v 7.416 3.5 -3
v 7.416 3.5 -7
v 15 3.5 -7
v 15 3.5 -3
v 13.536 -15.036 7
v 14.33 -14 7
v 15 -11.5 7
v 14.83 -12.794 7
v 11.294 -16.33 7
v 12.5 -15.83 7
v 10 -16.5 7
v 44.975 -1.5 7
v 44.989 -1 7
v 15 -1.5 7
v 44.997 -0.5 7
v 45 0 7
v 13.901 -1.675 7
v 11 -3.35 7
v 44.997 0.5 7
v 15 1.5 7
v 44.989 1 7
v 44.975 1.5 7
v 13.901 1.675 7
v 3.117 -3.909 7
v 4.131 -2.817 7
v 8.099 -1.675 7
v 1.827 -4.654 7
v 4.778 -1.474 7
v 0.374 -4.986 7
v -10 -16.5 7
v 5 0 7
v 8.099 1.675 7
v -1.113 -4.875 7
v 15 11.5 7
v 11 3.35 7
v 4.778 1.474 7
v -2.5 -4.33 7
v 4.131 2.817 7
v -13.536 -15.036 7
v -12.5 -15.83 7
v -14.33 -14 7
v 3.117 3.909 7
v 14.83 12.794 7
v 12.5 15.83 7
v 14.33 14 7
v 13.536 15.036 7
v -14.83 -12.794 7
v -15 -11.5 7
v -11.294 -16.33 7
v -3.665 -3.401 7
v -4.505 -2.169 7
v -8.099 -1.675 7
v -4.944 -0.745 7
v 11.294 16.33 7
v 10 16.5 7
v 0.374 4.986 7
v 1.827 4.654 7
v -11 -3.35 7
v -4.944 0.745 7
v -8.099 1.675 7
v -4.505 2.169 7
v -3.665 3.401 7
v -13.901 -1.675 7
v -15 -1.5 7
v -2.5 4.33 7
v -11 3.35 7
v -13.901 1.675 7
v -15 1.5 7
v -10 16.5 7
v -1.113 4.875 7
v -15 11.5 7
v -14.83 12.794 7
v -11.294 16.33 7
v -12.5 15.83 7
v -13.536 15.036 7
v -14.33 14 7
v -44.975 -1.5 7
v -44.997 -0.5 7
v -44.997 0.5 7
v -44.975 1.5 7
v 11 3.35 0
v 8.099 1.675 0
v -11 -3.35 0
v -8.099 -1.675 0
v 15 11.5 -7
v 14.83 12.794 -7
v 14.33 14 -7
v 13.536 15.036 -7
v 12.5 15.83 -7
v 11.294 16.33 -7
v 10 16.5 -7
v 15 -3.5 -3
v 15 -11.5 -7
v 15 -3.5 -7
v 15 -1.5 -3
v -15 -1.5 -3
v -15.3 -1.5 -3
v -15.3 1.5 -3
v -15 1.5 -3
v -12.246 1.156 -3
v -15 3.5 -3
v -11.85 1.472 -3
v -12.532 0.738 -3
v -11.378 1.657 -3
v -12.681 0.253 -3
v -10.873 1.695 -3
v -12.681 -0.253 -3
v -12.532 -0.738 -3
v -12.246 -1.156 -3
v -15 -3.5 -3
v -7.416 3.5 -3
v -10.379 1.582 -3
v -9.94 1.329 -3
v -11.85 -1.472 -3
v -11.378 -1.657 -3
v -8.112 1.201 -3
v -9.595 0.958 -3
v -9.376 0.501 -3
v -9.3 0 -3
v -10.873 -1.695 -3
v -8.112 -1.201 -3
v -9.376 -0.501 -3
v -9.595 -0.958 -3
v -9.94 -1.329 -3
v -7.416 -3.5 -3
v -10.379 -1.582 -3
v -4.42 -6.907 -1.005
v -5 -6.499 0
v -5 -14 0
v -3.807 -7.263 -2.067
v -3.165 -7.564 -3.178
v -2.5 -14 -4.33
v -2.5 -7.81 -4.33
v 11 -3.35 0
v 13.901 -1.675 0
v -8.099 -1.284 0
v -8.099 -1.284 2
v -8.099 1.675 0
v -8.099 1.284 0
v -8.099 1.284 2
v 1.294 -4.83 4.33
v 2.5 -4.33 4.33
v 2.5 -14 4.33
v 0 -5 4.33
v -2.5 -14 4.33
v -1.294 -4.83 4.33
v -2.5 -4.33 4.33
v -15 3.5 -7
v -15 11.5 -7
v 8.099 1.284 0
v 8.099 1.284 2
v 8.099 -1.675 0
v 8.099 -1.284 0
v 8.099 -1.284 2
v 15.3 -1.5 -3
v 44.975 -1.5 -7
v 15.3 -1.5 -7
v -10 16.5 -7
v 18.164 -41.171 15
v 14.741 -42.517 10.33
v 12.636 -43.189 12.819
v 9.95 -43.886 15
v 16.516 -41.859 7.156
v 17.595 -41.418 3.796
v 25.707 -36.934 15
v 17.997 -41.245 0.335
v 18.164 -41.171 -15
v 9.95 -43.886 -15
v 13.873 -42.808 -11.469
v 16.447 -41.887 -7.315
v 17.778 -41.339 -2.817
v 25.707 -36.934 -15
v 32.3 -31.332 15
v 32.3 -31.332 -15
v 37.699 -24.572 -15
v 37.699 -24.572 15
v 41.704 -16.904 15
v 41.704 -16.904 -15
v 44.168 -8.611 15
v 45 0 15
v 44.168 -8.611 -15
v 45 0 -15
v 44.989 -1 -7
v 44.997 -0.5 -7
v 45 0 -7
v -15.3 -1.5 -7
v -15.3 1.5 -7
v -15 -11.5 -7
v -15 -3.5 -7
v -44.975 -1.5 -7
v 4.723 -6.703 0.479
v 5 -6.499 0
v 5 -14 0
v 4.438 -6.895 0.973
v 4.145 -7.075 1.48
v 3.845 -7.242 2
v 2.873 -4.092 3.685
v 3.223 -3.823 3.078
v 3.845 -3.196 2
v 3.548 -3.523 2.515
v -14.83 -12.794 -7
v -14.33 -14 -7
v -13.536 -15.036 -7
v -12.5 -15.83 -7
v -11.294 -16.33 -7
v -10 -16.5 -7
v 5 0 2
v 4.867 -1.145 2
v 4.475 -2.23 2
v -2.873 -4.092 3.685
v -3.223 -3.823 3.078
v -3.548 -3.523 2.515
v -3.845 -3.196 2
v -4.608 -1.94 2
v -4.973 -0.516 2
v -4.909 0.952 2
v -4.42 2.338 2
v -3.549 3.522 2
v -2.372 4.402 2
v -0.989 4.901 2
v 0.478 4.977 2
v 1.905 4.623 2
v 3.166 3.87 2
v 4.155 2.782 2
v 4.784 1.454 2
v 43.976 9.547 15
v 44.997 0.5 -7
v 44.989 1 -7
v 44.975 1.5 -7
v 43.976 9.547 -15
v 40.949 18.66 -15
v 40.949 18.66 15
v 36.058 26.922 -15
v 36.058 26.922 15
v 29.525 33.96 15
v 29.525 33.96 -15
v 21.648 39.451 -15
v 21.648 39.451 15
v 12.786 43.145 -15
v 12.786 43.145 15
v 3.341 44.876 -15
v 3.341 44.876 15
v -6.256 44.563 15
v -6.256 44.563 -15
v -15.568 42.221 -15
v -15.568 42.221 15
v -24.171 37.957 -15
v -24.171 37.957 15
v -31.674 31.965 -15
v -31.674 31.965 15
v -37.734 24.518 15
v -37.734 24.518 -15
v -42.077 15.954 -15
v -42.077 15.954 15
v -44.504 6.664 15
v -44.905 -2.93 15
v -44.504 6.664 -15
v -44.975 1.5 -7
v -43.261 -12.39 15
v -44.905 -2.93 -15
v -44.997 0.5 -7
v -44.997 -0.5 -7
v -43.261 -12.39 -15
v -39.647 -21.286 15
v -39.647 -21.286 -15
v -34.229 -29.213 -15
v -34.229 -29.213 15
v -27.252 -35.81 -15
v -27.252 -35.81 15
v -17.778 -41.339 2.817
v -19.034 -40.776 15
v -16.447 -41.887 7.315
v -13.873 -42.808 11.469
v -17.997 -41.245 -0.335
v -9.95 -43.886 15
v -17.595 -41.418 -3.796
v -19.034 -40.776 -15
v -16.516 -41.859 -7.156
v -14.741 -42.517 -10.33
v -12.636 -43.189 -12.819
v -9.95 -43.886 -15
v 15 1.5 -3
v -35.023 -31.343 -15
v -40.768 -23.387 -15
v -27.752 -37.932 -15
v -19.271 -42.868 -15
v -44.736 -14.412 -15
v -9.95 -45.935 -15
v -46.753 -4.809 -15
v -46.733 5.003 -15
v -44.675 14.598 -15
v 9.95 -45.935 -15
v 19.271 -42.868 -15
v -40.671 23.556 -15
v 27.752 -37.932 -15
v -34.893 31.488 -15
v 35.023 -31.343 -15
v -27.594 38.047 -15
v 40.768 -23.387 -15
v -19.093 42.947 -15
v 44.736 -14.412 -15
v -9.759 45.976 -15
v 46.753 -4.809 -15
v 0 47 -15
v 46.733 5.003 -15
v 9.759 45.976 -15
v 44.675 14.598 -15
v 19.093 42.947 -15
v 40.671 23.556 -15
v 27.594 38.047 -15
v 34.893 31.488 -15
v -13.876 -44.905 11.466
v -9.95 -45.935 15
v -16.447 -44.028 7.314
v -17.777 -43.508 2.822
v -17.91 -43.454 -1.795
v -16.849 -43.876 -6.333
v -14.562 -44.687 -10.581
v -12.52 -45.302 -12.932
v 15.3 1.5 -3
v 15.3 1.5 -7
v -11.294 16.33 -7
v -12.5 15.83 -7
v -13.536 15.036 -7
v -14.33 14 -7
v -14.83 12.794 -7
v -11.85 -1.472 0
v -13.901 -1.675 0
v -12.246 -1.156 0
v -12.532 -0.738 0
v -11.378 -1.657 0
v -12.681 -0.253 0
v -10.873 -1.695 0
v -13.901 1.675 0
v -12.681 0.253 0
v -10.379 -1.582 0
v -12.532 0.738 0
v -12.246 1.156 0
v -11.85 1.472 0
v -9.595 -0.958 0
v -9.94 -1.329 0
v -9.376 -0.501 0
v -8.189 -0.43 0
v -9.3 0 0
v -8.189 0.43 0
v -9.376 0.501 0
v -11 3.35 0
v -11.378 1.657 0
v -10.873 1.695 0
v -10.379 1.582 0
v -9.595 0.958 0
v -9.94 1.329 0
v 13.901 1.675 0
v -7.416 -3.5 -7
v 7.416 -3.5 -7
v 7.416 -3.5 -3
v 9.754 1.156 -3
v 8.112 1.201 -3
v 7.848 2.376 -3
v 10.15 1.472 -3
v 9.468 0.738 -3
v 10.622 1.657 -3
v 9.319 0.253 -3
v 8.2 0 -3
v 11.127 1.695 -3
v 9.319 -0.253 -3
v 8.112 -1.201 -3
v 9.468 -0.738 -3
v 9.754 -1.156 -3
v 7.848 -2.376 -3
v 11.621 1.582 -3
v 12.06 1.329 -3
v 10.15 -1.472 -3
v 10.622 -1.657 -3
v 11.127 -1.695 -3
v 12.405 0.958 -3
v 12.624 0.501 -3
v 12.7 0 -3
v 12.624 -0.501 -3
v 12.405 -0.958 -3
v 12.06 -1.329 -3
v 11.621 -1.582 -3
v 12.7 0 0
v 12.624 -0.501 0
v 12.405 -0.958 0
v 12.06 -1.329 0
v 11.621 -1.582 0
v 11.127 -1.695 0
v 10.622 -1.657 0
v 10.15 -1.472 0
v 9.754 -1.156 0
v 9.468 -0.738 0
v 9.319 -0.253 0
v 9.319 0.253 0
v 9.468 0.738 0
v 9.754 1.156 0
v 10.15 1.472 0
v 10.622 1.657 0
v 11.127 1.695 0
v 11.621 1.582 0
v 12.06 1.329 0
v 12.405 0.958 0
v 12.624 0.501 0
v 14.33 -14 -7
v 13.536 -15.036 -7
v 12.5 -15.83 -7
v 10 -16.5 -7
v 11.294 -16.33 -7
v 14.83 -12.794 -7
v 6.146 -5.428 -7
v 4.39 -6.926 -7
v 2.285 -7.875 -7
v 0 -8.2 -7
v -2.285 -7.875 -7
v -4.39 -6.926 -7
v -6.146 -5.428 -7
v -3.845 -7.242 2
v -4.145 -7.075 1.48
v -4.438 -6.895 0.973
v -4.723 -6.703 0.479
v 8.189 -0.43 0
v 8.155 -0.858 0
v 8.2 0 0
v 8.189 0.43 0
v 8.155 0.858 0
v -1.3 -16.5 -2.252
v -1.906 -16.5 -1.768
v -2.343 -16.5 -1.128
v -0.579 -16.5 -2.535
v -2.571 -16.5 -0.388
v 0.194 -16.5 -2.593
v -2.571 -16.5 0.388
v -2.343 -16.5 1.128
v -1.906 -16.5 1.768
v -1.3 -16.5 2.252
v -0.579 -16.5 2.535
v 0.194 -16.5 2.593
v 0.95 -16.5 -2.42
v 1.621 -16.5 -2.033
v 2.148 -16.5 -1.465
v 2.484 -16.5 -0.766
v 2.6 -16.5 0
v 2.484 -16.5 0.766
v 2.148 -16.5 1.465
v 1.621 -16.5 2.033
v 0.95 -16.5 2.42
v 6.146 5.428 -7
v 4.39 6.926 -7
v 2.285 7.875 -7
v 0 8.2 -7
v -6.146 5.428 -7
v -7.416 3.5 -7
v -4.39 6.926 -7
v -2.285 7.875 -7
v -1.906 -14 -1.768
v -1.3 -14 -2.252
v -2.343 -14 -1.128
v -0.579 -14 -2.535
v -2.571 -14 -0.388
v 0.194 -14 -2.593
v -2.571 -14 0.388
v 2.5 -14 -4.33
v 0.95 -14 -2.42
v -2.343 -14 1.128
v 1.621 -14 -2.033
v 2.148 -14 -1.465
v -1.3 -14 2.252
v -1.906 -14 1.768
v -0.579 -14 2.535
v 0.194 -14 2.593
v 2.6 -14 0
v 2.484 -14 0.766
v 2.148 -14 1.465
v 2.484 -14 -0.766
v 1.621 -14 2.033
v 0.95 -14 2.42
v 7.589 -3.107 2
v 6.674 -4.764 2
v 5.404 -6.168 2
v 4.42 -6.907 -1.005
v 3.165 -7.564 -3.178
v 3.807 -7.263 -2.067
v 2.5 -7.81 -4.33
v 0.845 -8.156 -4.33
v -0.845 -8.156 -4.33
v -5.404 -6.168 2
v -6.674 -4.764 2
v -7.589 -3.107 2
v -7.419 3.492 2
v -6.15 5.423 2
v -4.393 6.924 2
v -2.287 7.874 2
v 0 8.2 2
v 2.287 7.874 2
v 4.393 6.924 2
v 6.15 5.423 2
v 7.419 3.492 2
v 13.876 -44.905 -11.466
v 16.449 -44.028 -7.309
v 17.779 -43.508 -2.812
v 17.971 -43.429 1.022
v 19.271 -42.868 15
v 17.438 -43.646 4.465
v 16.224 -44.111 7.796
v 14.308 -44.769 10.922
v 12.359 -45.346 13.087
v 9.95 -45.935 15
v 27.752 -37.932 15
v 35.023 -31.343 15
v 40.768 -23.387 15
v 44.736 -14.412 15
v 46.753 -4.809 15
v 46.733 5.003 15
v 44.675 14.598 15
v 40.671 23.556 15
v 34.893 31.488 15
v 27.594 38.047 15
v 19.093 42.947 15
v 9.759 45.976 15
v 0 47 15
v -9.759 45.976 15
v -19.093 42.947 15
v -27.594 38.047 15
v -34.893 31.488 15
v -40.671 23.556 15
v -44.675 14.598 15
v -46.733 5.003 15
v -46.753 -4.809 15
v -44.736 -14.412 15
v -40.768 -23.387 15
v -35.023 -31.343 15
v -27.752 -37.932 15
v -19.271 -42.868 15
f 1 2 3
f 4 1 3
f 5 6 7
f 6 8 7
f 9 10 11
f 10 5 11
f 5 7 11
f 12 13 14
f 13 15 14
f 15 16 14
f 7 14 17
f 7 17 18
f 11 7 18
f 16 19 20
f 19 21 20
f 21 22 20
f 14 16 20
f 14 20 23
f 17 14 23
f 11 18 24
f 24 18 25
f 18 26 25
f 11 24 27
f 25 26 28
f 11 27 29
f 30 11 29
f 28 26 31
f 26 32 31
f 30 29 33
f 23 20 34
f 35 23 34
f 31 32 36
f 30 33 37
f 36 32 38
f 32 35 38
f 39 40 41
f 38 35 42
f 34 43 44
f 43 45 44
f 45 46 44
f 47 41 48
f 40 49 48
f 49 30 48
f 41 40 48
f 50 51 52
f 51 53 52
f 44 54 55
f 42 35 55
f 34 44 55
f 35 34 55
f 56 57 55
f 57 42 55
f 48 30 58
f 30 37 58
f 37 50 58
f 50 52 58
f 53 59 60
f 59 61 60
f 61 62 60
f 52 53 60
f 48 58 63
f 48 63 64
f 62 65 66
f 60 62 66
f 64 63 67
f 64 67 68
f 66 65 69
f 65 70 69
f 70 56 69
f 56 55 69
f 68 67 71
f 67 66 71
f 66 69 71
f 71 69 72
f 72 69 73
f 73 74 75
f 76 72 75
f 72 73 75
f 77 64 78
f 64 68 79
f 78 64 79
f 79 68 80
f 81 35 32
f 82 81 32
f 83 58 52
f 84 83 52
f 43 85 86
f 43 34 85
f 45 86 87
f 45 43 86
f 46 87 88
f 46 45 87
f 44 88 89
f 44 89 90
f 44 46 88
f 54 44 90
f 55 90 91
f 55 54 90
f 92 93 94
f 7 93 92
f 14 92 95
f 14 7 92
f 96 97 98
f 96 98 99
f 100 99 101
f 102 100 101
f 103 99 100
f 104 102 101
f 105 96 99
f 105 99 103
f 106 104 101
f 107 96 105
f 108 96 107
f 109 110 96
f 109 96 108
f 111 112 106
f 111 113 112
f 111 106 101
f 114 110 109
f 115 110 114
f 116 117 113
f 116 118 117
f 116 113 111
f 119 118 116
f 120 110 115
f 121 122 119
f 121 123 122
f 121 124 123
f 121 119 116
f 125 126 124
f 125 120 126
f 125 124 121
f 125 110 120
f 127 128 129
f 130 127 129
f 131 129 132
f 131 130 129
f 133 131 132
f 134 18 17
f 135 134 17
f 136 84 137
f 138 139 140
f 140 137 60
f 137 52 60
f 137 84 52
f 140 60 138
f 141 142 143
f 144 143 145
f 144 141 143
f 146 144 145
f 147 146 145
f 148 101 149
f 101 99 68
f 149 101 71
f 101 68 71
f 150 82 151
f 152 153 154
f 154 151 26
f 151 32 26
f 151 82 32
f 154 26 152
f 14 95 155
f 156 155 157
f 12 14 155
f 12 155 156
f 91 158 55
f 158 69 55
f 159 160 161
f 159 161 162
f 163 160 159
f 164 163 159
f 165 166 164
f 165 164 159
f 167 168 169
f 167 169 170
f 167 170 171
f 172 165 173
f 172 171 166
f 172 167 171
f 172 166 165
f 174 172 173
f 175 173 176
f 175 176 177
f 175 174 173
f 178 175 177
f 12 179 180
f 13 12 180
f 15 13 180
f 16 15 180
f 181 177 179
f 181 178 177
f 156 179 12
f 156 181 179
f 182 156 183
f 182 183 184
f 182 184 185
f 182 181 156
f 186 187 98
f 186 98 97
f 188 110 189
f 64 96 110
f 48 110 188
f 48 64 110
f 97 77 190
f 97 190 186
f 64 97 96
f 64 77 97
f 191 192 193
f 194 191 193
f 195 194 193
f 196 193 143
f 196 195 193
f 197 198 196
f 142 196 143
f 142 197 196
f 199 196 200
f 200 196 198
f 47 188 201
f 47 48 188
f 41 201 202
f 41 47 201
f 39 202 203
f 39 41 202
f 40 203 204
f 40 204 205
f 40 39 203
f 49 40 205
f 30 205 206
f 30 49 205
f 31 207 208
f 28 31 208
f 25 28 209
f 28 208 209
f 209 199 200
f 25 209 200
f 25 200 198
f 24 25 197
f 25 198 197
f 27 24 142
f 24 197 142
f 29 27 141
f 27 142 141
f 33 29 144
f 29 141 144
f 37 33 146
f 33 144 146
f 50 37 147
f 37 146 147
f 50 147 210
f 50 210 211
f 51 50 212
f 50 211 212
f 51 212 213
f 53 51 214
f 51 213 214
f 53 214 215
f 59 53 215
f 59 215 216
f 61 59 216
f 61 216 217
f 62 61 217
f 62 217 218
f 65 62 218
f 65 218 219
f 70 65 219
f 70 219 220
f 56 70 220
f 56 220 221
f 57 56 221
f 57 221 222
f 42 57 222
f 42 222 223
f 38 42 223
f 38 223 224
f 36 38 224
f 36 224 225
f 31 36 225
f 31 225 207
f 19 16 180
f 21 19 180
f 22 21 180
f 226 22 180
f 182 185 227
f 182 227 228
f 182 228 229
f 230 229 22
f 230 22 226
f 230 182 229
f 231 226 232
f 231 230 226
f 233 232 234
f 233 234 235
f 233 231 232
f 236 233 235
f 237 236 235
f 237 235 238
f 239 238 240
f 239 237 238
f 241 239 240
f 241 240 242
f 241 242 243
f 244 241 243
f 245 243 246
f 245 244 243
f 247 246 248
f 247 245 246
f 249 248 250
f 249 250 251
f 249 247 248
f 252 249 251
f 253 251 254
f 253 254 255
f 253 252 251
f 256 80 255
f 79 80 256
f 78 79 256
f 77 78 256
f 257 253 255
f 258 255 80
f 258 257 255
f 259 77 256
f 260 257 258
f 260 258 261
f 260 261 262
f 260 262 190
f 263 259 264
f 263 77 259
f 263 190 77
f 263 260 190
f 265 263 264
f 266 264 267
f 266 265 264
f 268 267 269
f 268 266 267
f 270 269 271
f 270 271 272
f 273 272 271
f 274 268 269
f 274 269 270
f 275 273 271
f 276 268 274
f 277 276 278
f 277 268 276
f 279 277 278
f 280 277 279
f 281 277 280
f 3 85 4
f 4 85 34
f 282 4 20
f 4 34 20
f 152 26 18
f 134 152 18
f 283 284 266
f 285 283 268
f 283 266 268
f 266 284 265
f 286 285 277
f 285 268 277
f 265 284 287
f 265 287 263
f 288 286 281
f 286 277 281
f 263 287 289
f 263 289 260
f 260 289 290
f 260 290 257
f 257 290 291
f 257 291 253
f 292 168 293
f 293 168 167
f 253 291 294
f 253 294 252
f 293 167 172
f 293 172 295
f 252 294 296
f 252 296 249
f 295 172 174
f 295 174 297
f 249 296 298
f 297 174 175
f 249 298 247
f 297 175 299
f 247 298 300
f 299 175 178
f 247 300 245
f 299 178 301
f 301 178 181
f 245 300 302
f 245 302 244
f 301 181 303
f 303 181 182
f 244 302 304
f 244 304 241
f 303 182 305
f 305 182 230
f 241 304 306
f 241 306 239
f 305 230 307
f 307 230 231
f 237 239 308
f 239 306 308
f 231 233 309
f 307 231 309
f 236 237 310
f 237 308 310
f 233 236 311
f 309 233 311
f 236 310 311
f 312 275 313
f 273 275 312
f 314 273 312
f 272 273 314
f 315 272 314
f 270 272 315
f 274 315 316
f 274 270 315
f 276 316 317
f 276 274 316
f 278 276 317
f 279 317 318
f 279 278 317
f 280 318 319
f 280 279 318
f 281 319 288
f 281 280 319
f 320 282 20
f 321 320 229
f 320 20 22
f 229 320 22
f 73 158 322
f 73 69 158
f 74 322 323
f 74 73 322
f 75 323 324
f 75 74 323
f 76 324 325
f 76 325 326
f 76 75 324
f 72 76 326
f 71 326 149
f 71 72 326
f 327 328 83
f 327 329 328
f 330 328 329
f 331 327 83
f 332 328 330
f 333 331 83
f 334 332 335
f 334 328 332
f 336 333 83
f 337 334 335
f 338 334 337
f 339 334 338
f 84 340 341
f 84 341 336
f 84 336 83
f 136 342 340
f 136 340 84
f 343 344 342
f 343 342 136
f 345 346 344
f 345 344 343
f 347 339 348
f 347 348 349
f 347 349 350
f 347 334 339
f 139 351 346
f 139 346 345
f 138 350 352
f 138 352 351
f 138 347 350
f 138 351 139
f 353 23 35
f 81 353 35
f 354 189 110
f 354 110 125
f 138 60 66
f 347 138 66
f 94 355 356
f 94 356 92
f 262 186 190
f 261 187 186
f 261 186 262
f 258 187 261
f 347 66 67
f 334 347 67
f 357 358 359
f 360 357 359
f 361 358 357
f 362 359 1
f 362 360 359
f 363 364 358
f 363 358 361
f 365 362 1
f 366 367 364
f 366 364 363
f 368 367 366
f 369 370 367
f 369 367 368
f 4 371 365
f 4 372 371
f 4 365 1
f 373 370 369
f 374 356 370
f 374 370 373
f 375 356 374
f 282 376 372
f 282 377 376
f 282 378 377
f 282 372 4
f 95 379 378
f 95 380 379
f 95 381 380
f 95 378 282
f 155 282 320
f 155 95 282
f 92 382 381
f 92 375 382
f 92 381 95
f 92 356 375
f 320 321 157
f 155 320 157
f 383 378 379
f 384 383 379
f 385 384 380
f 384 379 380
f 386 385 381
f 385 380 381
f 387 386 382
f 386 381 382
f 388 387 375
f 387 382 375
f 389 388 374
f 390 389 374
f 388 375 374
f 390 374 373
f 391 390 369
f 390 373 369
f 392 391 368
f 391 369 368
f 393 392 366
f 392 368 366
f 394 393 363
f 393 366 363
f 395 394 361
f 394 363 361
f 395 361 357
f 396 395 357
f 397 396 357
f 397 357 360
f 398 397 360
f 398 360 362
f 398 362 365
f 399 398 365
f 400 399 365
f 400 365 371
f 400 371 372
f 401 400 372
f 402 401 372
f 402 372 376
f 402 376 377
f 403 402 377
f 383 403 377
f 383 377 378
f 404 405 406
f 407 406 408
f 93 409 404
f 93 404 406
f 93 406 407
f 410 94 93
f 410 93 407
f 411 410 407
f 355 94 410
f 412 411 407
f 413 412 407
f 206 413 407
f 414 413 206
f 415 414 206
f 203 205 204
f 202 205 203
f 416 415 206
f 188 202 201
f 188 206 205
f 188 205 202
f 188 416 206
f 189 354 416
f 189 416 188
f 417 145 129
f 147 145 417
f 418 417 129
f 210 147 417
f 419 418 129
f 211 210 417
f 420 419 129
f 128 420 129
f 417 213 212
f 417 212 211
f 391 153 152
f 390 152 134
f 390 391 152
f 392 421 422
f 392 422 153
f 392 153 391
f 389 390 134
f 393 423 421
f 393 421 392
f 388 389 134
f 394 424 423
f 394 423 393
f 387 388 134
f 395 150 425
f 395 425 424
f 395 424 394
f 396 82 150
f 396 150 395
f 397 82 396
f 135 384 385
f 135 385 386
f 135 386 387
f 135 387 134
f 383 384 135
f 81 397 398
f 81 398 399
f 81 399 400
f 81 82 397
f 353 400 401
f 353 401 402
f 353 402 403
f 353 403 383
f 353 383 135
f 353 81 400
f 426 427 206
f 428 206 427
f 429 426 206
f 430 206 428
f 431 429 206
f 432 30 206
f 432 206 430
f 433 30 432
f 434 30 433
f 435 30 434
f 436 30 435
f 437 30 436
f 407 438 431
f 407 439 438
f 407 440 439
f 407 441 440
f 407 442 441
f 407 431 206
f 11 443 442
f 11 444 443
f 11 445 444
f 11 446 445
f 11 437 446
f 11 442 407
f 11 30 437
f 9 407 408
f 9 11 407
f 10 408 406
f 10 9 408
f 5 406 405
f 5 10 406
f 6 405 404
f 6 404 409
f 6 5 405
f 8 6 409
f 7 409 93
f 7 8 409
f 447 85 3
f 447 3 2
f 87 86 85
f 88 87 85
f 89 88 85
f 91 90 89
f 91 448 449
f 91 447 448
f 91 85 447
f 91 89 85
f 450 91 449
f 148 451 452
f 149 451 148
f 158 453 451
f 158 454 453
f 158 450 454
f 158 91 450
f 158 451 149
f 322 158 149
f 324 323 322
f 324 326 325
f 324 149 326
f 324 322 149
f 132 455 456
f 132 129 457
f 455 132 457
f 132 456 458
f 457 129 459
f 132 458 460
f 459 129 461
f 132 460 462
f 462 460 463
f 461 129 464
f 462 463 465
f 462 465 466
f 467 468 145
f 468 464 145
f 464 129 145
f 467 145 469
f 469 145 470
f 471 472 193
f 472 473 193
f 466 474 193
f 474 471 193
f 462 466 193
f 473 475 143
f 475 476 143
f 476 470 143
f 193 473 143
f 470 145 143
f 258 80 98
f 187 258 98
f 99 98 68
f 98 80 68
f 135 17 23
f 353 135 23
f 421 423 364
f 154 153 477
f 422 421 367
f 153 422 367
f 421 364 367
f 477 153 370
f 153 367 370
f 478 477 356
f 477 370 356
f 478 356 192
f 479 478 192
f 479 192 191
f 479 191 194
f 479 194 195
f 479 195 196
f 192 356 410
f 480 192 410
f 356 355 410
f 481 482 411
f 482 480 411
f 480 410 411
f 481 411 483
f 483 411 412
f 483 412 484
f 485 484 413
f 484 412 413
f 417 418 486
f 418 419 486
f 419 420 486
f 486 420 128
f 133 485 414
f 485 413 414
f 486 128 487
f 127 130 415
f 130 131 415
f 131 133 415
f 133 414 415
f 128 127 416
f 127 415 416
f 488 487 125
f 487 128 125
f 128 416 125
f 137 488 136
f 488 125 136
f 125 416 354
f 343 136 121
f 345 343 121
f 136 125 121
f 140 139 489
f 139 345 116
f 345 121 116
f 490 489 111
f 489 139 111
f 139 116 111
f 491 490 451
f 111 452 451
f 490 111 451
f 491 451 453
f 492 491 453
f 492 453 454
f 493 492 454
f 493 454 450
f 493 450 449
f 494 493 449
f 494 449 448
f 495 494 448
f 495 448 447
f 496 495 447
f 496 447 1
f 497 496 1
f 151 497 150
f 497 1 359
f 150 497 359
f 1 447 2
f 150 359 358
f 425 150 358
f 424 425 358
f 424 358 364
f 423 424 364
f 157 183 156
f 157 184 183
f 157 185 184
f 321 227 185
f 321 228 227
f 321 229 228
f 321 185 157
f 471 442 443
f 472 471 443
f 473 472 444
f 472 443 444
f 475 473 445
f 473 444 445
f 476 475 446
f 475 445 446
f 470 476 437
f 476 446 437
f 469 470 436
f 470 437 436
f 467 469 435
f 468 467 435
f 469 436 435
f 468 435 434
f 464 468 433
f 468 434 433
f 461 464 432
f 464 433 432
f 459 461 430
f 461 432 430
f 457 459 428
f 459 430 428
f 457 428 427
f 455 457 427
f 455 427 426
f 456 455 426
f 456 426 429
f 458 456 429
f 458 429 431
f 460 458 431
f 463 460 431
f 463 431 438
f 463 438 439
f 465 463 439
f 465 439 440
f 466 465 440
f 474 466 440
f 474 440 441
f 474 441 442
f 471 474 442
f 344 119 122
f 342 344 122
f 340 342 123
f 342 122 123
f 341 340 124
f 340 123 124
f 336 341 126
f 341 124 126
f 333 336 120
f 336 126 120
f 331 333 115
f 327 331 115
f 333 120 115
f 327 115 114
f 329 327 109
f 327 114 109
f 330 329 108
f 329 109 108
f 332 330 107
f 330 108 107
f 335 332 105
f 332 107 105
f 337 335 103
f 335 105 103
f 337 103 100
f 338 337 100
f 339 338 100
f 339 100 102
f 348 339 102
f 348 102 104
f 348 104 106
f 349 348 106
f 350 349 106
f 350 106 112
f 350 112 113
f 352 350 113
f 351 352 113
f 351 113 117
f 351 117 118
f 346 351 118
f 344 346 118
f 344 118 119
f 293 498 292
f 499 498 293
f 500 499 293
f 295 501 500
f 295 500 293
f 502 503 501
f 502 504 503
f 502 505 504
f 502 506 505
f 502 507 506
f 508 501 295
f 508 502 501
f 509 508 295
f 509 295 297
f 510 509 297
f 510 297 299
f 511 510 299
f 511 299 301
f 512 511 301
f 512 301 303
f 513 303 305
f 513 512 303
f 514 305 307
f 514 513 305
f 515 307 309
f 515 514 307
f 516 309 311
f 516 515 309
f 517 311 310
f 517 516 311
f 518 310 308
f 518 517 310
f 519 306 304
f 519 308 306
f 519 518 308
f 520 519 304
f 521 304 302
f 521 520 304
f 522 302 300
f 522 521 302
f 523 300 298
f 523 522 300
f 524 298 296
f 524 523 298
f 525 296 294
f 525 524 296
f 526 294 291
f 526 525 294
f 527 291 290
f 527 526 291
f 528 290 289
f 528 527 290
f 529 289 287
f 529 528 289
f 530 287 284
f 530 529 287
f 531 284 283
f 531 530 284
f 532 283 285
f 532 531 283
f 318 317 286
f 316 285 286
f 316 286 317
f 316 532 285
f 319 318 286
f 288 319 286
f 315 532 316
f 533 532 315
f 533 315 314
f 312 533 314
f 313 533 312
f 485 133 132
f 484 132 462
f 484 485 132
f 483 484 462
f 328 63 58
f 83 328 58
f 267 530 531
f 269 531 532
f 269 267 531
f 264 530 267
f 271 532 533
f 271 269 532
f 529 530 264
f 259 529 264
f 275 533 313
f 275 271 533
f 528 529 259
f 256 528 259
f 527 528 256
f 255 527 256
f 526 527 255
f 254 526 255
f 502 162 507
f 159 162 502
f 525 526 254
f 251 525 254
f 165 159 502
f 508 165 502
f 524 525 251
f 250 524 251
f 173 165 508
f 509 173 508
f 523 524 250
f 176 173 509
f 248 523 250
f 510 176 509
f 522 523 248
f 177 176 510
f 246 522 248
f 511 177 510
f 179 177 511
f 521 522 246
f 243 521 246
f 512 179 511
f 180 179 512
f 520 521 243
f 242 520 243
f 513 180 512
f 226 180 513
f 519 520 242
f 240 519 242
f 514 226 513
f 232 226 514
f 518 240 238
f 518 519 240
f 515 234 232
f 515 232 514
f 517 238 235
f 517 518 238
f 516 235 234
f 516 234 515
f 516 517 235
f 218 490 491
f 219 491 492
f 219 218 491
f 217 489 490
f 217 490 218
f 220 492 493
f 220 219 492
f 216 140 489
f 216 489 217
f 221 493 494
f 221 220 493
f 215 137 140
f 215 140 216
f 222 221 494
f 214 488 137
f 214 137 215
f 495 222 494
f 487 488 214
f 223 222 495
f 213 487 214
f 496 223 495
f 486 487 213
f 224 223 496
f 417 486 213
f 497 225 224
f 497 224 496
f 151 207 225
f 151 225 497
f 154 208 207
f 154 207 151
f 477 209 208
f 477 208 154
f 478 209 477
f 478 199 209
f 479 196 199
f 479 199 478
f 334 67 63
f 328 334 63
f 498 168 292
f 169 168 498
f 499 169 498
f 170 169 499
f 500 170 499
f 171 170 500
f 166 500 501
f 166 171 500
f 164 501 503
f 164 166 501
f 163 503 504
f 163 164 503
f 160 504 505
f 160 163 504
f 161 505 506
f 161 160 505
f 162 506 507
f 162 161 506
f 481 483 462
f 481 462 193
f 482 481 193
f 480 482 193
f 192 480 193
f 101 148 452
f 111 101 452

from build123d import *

# Parameters (mm, degrees)
SKETCH_R        = 47
SKETCH_R_2      = 45
PAD_DEPTH       = 15
PAD001_DEPTH    = 7
SKETCH002_R     = 18
POCKET_DEPTH    = 30.501
SKETCH003_R     = 5
SKETCH003_R_2   = 1.7
POCKET001_DEPTH = 22.001
SKETCH004_R     = 8.2
POCKET002_DEPTH = 9
SKETCH005_W     = 30.6
SKETCH005_H     = 7
POCKET003_DEPTH = 4
POCKET004_DEPTH = 7
POCKET005_DEPTH = 14
SKETCH008_R     = 2.6
POCKET006_DEPTH = 5


with BuildPart() as part:
    # Sketch → Pad (new body, symmetric)
    with BuildSketch(Plane.XY):
        Circle(SKETCH_R)
        Circle(SKETCH_R_2, mode=Mode.SUBTRACT)
    extrude(amount=PAD_DEPTH, both=True)

    # Sketch001 → Pad001 (join, symmetric)
    with BuildSketch(Plane.XY):
        with BuildLine():
            Line((-44.974993, 1.5), (-15, 1.5))
            Line((-15, 1.5), (-15, 11.5))
            ThreePointArc((-10, 16.5), (-13.535534, 15.035534), (-15, 11.5))
            Line((-10, 16.5), (10, 16.5))
            ThreePointArc((15, 11.5), (13.535534, 15.035534), (10, 16.5))
            Line((15, 11.5), (15, 1.5))
            Line((15, 1.5), (44.974993, 1.5))
            ThreePointArc((44.974993, -1.5), (45, 0), (44.974993, 1.5))
            Line((15, -1.5), (44.974993, -1.5))
            Line((15, -11.5), (15, -1.5))
            ThreePointArc((10, -16.5), (13.535534, -15.035534), (15, -11.5))
            Line((-10, -16.5), (10, -16.5))
            ThreePointArc((-15, -11.5), (-13.535534, -15.035534), (-10, -16.5))
            Line((-15, -1.5), (-15, -11.5))
            Line((-44.974993, -1.5), (-15, -1.5))
            ThreePointArc((-44.974993, 1.5), (-45, 0), (-44.974993, -1.5))
        make_face()
    extrude(amount=PAD001_DEPTH, both=True)

    # Sketch002 (on Face18 of Pad001) → Pocket (cut, through all)
    with BuildSketch(Plane.XZ.offset(16.5)):
        Circle(SKETCH002_R)
    extrude(amount=POCKET_DEPTH, mode=Mode.SUBTRACT)

    # Sketch003 (on Face7 of Pocket) → Pocket001 (cut, through all)
    with BuildSketch(Plane(origin=(0, 0, -7), x_dir=(1, 0, 0), z_dir=(0, 0, -1))):
        Circle(SKETCH003_R)
        with Locations((-11, 0)):
            Circle(SKETCH003_R_2)
        with Locations((11, 0)):
            Circle(SKETCH003_R_2)
    extrude(amount=-POCKET001_DEPTH, mode=Mode.SUBTRACT)

    # Sketch004 (on Face7 of Pocket001) → Pocket002 (cut)
    with BuildSketch(Plane(origin=(0, 0, -7), x_dir=(1, 0, 0), z_dir=(0, 0, -1))):
        Circle(SKETCH004_R)
    extrude(amount=-POCKET002_DEPTH, mode=Mode.SUBTRACT)

    # Sketch005 (on Face7 of Pocket002) → Pocket003 (cut)
    with BuildSketch(Plane(origin=(0, 0, -7), x_dir=(1, 0, 0), z_dir=(0, 0, -1))):
        Rectangle(SKETCH005_W, SKETCH005_H)
    extrude(amount=-POCKET003_DEPTH, mode=Mode.SUBTRACT)

    # Sketch006 (on Face9 of Pocket003) → Pocket004 (cut)
    with BuildSketch(Plane.XY.offset(7)):
        Polygon((-8.098815, -1.675), (-8.098815, 1.675), (-11, 3.35), (-13.901185, 1.675), (-13.901185, -1.675), (-11, -3.35), align=None)
        Polygon((11, -3.35), (13.901185, -1.675), (13.901185, 1.675), (11, 3.35), (8.098815, 1.675), (8.098815, -1.675), align=None)
    extrude(amount=-POCKET004_DEPTH, mode=Mode.SUBTRACT)

    # Sketch007 → Pocket005 (cut)
    with BuildSketch(Plane.XZ):
        Polygon((2.5, 4.330127), (-2.5, 4.330127), (-5, 0), (-2.5, -4.330127), (2.5, -4.330127), (5, 0), align=None)
    extrude(amount=POCKET005_DEPTH, mode=Mode.SUBTRACT)

    # Sketch008 (on Face23 of Pocket005) → Pocket006 (cut)
    with BuildSketch(Plane.XZ.offset(16.5)):
        Circle(SKETCH008_R)
    extrude(amount=-POCKET006_DEPTH, mode=Mode.SUBTRACT)


solid = part.part
